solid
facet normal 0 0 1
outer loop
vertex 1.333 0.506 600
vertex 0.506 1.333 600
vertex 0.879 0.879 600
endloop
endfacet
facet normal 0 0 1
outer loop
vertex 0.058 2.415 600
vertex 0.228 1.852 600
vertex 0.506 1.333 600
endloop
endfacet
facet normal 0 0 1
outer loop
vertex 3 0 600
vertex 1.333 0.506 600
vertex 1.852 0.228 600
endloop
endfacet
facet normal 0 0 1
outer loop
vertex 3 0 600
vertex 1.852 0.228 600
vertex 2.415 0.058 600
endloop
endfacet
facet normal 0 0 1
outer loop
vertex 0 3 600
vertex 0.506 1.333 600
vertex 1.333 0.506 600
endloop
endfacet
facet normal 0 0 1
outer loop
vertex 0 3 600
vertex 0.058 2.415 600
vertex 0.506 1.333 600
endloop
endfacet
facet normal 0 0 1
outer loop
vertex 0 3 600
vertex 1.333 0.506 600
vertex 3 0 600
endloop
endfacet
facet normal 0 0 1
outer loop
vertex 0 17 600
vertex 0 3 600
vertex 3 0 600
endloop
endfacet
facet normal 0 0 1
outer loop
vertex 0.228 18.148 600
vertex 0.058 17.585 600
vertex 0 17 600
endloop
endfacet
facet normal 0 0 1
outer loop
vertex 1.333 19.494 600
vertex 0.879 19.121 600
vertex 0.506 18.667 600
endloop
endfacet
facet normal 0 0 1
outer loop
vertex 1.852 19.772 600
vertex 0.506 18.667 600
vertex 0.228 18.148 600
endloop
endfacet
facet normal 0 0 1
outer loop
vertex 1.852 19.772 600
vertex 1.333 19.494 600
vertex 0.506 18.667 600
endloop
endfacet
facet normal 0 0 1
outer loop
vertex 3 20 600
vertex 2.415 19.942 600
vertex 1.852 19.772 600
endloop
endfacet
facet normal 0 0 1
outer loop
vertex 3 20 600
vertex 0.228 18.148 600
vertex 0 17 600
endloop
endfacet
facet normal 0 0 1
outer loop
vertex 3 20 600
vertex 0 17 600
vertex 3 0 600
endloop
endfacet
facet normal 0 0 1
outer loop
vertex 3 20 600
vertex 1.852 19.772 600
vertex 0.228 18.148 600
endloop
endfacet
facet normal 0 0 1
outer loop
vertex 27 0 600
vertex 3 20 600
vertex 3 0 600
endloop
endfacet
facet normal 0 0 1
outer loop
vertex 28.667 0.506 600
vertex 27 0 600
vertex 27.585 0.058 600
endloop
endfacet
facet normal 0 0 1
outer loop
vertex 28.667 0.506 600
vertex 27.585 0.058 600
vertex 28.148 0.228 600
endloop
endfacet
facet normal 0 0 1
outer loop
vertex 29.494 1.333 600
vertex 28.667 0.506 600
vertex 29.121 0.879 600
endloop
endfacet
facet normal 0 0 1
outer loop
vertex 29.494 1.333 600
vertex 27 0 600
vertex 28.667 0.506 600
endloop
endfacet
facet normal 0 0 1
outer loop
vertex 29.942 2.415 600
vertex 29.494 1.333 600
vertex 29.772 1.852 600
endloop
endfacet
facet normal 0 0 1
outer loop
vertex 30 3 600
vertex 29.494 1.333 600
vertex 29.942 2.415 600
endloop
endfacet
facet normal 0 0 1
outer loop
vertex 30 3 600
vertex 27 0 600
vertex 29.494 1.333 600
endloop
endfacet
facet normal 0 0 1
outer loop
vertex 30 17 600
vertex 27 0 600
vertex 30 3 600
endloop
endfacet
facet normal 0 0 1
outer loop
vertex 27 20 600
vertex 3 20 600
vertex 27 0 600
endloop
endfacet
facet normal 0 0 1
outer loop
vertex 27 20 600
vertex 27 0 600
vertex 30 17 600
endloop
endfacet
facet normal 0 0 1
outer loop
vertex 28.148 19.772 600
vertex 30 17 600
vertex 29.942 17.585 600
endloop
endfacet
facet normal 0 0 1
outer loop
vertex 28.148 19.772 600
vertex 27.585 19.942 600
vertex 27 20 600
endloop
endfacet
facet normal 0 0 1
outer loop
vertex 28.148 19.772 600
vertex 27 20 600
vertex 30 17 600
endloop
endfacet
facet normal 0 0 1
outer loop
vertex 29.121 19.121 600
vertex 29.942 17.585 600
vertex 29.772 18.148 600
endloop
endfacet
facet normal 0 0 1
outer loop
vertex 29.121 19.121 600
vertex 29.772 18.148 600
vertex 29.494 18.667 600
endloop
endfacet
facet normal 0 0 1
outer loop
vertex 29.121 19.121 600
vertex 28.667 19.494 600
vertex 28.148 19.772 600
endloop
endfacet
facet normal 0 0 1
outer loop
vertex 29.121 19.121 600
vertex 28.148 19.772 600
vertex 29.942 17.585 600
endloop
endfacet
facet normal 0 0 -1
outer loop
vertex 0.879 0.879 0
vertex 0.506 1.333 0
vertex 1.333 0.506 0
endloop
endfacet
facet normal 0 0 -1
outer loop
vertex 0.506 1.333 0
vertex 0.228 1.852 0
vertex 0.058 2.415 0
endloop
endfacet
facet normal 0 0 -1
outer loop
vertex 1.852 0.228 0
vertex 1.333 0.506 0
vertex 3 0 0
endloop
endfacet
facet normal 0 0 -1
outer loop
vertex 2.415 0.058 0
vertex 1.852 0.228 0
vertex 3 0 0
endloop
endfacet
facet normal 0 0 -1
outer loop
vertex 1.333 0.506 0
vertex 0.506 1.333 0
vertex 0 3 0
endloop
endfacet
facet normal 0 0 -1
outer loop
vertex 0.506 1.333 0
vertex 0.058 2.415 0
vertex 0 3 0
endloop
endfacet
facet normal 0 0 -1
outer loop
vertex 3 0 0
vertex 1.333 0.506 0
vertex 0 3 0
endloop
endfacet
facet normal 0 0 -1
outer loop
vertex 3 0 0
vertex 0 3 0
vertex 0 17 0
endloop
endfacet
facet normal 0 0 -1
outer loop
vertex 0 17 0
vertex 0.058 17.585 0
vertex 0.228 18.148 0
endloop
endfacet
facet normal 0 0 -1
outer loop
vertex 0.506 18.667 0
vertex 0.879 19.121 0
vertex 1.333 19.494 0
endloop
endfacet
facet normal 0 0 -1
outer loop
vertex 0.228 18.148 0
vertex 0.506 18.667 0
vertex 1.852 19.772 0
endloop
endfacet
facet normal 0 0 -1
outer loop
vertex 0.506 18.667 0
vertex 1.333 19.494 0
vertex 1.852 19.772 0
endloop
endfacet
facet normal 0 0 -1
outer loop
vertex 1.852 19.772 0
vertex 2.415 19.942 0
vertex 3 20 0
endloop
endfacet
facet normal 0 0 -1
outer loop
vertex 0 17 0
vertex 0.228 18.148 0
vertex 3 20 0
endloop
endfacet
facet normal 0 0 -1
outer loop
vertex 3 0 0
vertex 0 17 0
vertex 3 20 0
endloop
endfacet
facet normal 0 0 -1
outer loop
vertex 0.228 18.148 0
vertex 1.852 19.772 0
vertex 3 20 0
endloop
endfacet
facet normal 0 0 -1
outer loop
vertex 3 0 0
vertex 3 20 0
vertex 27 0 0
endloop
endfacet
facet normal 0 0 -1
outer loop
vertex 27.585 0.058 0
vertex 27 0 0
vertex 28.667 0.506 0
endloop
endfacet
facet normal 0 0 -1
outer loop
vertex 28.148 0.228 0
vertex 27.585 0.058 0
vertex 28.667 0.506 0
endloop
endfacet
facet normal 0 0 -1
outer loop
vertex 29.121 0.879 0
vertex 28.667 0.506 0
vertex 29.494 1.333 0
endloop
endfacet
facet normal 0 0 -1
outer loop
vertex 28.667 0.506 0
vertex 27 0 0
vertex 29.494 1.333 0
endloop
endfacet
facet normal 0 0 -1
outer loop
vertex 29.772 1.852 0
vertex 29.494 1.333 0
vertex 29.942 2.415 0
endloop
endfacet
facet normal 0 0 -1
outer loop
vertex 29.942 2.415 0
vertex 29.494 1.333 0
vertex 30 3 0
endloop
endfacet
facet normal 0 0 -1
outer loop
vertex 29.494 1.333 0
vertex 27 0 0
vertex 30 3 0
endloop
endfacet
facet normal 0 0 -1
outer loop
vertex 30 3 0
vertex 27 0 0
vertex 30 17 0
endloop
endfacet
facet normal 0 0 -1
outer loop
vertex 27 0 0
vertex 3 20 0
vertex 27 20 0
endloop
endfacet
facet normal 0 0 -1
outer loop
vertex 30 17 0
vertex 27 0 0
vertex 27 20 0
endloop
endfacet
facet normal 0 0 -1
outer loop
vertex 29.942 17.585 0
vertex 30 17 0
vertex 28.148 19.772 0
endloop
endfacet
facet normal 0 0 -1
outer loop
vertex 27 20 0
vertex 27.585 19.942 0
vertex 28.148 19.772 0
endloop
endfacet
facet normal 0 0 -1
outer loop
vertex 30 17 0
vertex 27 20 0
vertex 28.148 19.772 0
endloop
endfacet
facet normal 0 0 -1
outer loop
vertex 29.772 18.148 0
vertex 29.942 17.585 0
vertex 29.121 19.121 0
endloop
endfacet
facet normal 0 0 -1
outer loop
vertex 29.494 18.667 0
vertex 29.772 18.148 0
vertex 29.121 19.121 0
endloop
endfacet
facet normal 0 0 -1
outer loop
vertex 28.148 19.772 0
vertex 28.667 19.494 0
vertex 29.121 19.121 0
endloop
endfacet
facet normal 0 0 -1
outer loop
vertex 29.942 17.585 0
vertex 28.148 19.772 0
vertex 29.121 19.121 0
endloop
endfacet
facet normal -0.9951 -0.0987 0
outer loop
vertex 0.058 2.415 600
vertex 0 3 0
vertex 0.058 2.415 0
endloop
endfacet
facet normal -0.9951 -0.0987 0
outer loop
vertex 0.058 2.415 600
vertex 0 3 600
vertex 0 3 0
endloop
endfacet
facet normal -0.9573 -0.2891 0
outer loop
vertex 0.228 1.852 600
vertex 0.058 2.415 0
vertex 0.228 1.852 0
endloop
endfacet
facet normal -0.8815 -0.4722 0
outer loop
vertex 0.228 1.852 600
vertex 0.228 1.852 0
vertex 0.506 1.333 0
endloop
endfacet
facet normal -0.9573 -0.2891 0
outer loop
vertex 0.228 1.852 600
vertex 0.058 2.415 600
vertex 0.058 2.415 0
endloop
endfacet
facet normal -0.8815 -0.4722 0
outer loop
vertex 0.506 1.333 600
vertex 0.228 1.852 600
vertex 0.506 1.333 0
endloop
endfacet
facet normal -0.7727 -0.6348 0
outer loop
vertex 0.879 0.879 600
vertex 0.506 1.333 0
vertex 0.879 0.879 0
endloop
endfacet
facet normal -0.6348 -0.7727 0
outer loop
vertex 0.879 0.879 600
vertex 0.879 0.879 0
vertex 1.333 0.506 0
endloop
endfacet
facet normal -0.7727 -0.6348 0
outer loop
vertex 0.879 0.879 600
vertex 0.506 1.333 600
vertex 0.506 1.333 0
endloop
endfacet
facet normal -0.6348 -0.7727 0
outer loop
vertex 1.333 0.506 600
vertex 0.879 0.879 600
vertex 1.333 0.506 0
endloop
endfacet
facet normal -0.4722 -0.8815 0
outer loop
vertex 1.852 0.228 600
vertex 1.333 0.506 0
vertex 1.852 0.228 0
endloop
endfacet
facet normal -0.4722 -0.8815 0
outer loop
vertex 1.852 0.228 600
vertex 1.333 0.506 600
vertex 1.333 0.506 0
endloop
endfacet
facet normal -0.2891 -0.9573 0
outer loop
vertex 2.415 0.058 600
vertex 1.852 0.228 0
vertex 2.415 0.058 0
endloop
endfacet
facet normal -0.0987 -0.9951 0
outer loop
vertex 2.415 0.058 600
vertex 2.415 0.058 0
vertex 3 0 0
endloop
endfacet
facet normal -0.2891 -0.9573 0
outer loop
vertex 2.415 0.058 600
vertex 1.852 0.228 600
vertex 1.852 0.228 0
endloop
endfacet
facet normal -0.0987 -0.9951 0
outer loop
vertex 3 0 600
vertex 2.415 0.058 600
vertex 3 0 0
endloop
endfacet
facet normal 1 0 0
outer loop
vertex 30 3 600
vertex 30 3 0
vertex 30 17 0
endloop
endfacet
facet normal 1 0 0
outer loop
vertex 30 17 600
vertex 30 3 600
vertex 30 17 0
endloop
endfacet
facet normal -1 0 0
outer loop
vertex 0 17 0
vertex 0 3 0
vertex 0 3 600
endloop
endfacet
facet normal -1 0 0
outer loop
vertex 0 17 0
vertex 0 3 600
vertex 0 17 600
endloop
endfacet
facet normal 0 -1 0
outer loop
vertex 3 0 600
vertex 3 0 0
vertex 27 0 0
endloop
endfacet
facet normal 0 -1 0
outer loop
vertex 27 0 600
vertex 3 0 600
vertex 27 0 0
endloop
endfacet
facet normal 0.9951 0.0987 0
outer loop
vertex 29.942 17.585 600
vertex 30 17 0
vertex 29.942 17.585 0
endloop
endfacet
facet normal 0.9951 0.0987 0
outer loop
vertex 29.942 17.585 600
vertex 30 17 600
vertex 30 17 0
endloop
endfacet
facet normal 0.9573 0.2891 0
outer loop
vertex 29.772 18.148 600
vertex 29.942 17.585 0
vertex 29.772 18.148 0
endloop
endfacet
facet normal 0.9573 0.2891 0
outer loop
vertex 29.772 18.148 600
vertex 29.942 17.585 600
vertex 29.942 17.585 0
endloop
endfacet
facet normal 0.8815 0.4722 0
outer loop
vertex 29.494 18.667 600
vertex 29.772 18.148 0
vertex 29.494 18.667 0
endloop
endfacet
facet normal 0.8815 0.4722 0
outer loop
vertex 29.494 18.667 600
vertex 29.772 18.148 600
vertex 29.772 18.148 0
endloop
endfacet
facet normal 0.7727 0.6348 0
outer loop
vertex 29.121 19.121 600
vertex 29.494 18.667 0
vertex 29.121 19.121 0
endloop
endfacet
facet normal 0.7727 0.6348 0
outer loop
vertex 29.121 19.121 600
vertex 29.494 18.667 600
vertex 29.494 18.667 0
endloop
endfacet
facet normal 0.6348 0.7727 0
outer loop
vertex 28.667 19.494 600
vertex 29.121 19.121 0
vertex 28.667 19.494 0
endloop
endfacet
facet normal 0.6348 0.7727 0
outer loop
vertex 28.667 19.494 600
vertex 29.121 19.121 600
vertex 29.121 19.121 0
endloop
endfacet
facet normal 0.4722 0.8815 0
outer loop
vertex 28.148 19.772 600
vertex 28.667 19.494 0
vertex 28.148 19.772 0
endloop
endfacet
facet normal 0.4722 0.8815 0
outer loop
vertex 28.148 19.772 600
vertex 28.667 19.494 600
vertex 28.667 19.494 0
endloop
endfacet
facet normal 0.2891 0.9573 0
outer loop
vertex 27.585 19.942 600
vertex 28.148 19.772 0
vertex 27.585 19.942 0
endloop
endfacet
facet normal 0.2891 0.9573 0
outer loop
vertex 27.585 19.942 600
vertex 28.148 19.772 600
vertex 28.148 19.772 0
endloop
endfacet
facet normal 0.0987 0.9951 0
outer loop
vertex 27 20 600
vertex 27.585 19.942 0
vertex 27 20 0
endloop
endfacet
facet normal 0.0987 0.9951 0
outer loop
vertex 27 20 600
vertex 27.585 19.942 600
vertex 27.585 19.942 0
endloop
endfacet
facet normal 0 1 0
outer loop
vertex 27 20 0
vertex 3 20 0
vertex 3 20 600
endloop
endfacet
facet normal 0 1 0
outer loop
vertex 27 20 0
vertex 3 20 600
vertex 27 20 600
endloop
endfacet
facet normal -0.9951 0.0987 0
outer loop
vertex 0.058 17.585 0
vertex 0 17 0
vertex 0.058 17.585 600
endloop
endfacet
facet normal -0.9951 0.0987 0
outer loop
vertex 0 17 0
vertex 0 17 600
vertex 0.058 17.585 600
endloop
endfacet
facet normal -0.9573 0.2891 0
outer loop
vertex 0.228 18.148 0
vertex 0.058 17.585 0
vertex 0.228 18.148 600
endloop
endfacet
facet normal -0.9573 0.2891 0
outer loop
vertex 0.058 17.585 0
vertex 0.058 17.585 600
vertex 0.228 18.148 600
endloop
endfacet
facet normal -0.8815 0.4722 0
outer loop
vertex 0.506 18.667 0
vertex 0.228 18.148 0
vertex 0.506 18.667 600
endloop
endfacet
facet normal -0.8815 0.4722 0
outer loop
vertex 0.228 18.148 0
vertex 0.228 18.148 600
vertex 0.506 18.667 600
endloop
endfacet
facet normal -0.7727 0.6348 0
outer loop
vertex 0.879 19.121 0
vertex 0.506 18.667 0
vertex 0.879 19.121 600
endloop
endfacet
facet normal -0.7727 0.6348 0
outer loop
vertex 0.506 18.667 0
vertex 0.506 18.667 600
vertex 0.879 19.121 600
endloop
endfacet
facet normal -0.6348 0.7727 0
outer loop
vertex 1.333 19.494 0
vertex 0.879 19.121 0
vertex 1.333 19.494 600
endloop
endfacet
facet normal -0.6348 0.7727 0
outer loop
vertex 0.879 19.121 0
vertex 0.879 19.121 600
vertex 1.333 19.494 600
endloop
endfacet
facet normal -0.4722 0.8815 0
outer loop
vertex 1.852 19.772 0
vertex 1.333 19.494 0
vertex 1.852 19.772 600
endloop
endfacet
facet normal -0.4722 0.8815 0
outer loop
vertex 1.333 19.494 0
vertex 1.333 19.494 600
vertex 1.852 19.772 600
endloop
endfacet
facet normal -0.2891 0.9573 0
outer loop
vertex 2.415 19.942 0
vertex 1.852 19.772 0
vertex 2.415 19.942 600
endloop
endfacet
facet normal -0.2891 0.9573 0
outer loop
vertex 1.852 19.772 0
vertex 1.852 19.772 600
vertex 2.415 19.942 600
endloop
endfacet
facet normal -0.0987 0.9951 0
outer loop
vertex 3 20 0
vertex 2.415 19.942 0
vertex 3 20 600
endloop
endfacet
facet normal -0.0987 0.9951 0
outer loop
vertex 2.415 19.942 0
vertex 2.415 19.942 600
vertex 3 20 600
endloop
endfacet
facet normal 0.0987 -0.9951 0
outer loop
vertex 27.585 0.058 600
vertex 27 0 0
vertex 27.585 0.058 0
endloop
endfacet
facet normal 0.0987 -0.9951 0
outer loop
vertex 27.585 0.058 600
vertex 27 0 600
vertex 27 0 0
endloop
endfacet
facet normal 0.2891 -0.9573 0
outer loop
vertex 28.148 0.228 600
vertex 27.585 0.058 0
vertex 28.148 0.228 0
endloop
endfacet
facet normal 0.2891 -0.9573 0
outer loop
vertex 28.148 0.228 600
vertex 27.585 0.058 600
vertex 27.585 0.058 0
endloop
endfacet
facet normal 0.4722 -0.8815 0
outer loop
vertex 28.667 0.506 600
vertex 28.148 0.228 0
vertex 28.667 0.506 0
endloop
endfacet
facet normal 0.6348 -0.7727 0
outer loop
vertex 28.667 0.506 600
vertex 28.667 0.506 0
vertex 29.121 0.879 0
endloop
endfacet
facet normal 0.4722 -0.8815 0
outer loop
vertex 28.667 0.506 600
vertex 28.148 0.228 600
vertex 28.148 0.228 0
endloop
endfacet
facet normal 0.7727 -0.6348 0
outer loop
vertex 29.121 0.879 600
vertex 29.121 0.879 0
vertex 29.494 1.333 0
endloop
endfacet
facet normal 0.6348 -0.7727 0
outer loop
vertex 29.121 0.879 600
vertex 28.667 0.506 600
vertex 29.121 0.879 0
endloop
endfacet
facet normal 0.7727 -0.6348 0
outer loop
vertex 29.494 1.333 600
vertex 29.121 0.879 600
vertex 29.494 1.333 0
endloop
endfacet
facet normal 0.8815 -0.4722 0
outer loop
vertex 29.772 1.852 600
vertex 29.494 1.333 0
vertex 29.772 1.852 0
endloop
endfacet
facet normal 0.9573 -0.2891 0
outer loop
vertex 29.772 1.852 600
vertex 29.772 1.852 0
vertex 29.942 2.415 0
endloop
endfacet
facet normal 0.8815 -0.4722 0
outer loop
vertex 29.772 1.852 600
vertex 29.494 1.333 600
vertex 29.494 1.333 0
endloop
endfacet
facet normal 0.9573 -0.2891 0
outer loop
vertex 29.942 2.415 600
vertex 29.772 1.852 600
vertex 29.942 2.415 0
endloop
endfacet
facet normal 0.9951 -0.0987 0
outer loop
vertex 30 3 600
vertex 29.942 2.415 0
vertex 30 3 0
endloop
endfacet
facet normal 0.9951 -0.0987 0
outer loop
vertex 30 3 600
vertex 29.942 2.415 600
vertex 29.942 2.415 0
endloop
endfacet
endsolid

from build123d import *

# Parameters (mm, degrees)
ESQUISSE1_W        = 30
ESQUISSE1_H        = 20
BOSS_EXTRU_1_DEPTH = 600
CONG_1_R           = 3


with BuildPart() as part:
    # Esquisse1 → Boss.-Extru.1 (new body)
    with BuildSketch(Plane.XY):
        with Locations((15, 10)):
            Rectangle(ESQUISSE1_W, ESQUISSE1_H)
    extrude(amount=BOSS_EXTRU_1_DEPTH)

    # Congé1
    cong_1_edges = [part.edges().sort_by_distance(p)[0] for p in [
        (0, 20, 300),
        (30, 20, 300),
        (30, 0, 300),
        (0, 0, 300),
    ]]
    fillet(cong_1_edges, radius=CONG_1_R)


solid = part.part
